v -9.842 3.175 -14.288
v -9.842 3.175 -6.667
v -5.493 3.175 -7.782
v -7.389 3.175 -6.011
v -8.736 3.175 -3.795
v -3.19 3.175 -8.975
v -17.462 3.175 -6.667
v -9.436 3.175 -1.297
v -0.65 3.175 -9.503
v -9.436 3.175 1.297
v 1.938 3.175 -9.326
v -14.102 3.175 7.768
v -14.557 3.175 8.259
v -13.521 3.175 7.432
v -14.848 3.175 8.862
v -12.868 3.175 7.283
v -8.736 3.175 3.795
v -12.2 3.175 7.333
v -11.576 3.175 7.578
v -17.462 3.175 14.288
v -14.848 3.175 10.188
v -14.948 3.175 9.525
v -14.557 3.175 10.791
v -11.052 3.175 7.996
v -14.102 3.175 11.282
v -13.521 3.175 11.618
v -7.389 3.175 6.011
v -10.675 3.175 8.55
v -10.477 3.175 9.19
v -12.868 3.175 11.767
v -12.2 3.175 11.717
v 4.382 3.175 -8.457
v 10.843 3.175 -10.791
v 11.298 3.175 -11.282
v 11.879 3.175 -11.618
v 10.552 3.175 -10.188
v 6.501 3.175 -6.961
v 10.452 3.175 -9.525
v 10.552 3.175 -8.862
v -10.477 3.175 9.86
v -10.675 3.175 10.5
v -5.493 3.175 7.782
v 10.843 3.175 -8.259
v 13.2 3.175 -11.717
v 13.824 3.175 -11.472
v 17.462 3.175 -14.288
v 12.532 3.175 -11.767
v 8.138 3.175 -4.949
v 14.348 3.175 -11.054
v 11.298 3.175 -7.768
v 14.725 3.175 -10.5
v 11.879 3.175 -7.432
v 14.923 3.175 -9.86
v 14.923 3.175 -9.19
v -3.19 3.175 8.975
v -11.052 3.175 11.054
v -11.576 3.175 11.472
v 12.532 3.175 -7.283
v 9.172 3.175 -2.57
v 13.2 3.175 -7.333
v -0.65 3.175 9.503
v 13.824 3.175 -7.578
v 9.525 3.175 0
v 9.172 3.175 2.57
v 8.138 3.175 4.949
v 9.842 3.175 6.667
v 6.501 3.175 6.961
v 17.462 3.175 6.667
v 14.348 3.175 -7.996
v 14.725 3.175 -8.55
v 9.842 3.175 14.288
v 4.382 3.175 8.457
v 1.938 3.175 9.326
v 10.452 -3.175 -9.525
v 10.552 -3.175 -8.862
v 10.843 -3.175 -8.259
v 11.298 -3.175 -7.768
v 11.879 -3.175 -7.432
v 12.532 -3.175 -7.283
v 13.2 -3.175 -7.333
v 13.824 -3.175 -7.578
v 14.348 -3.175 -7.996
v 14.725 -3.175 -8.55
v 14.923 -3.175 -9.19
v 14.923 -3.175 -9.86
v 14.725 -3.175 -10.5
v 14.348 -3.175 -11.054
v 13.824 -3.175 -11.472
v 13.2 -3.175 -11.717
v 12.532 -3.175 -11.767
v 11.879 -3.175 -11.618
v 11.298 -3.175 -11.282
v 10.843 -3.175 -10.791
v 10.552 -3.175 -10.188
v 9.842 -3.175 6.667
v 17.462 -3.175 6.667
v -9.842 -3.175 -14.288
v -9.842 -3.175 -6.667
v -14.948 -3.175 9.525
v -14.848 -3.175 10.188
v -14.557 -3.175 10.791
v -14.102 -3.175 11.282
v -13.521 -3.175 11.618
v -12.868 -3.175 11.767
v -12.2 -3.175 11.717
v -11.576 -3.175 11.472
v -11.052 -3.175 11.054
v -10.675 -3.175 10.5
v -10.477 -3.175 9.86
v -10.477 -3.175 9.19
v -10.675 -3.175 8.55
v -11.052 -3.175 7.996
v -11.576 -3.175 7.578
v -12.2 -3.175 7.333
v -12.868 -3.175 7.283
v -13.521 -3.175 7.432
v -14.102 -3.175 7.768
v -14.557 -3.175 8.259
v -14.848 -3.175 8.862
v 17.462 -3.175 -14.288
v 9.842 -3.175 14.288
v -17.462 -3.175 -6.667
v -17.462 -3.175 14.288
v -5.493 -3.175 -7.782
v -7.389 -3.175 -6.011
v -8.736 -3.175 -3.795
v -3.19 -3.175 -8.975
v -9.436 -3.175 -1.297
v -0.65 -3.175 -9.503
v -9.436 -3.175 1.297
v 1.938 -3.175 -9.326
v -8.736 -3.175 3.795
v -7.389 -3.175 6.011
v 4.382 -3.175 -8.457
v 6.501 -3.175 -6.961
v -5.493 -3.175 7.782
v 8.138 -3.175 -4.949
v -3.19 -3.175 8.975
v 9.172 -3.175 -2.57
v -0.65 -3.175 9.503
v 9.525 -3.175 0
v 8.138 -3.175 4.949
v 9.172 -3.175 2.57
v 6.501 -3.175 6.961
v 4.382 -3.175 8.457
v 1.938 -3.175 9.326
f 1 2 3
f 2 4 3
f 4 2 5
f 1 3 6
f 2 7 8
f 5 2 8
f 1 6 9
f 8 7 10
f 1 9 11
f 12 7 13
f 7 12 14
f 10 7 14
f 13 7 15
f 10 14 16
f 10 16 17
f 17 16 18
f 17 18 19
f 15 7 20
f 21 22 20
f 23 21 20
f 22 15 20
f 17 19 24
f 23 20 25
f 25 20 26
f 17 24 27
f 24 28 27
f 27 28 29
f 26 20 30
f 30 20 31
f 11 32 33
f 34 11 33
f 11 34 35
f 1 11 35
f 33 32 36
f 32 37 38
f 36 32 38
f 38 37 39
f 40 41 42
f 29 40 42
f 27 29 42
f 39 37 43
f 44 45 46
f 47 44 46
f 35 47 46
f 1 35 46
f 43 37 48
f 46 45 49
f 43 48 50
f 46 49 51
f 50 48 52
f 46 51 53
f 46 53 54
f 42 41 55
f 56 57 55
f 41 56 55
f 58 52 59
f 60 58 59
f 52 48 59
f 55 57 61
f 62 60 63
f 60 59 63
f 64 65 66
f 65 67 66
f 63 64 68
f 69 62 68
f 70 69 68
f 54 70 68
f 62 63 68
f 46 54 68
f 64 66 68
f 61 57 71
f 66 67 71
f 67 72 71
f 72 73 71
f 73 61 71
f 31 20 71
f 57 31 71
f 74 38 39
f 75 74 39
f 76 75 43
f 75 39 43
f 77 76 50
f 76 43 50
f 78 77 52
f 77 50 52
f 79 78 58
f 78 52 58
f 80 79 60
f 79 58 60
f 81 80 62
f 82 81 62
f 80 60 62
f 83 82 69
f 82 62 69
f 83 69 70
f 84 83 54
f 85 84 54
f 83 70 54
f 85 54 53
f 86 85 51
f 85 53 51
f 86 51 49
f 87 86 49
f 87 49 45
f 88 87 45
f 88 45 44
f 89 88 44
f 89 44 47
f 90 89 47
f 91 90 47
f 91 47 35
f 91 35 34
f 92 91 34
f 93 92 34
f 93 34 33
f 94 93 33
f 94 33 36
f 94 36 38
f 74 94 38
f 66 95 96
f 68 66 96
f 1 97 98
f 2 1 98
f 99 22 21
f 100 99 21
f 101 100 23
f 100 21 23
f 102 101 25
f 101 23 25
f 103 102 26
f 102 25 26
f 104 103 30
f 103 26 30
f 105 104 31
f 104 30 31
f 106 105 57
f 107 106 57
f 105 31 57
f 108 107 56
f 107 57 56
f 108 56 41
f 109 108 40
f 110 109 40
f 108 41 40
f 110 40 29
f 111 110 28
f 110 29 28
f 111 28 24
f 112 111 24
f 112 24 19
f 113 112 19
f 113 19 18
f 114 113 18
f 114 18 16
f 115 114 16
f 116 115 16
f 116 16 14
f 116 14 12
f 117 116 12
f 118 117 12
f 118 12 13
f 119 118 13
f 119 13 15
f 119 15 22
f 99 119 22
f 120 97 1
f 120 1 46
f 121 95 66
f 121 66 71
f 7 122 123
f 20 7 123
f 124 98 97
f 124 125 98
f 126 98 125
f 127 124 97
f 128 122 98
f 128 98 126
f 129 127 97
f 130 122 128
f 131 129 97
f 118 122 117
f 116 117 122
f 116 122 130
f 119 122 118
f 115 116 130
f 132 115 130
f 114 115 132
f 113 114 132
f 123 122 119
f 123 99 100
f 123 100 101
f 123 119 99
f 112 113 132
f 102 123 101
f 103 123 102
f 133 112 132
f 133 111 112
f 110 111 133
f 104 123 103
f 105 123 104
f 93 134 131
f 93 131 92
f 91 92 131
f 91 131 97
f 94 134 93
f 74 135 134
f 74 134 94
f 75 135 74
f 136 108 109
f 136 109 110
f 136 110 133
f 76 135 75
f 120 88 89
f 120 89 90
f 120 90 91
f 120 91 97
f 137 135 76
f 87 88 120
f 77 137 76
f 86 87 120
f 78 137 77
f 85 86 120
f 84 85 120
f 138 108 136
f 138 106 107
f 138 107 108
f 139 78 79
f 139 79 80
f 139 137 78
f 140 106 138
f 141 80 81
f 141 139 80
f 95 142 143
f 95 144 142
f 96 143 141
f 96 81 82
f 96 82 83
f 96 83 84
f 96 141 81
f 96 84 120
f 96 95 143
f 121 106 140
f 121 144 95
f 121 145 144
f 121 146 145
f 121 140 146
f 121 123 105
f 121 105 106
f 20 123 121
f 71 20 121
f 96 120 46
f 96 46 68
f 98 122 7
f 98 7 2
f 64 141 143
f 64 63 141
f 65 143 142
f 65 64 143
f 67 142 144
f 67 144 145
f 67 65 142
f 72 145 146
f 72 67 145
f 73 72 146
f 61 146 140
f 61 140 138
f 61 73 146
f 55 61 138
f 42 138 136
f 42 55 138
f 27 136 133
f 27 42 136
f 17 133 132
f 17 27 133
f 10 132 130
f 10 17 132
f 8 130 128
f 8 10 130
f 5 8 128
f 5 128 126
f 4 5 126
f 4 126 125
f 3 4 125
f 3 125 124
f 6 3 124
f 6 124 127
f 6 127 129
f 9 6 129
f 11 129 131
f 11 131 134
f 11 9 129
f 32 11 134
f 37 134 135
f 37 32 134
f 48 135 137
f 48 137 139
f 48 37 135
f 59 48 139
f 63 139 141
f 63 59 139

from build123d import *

# Parameters (mm, degrees)
F0_W     = 34.925
F0_H     = 28.575
F0_R     = 9.525
F1_DEPTH = 3.175
F3_D     = 4.4958
F4_W     = 7.62
F4_H     = 7.62
F5_DEPTH = 6.351


with BuildPart() as f1:
    # F0 (on Front) → F1 (new body, symmetric)
    with BuildSketch(Plane.XZ):
        Rectangle(F0_W, F0_H)
        Circle(F0_R, mode=Mode.SUBTRACT)
    extrude(amount=F1_DEPTH, both=True)

    # F3 (through all)
    with Locations(Plane.XZ.offset(3.175)):
        with Locations((-12.7, 9.525), (12.7, -9.525)):
            Hole(F3_D / 2)

    # F4 (on face) → F5 (cut, through all)
    with BuildSketch(Plane.XZ.offset(3.175)):
        with Locations((-13.6525, -10.4775)):
            Rectangle(F4_W, F4_H)
        with Locations((13.6525, 10.4775)):
            Rectangle(F4_W, F4_H)
    extrude(amount=-F5_DEPTH, mode=Mode.SUBTRACT)


solid = f1.part
